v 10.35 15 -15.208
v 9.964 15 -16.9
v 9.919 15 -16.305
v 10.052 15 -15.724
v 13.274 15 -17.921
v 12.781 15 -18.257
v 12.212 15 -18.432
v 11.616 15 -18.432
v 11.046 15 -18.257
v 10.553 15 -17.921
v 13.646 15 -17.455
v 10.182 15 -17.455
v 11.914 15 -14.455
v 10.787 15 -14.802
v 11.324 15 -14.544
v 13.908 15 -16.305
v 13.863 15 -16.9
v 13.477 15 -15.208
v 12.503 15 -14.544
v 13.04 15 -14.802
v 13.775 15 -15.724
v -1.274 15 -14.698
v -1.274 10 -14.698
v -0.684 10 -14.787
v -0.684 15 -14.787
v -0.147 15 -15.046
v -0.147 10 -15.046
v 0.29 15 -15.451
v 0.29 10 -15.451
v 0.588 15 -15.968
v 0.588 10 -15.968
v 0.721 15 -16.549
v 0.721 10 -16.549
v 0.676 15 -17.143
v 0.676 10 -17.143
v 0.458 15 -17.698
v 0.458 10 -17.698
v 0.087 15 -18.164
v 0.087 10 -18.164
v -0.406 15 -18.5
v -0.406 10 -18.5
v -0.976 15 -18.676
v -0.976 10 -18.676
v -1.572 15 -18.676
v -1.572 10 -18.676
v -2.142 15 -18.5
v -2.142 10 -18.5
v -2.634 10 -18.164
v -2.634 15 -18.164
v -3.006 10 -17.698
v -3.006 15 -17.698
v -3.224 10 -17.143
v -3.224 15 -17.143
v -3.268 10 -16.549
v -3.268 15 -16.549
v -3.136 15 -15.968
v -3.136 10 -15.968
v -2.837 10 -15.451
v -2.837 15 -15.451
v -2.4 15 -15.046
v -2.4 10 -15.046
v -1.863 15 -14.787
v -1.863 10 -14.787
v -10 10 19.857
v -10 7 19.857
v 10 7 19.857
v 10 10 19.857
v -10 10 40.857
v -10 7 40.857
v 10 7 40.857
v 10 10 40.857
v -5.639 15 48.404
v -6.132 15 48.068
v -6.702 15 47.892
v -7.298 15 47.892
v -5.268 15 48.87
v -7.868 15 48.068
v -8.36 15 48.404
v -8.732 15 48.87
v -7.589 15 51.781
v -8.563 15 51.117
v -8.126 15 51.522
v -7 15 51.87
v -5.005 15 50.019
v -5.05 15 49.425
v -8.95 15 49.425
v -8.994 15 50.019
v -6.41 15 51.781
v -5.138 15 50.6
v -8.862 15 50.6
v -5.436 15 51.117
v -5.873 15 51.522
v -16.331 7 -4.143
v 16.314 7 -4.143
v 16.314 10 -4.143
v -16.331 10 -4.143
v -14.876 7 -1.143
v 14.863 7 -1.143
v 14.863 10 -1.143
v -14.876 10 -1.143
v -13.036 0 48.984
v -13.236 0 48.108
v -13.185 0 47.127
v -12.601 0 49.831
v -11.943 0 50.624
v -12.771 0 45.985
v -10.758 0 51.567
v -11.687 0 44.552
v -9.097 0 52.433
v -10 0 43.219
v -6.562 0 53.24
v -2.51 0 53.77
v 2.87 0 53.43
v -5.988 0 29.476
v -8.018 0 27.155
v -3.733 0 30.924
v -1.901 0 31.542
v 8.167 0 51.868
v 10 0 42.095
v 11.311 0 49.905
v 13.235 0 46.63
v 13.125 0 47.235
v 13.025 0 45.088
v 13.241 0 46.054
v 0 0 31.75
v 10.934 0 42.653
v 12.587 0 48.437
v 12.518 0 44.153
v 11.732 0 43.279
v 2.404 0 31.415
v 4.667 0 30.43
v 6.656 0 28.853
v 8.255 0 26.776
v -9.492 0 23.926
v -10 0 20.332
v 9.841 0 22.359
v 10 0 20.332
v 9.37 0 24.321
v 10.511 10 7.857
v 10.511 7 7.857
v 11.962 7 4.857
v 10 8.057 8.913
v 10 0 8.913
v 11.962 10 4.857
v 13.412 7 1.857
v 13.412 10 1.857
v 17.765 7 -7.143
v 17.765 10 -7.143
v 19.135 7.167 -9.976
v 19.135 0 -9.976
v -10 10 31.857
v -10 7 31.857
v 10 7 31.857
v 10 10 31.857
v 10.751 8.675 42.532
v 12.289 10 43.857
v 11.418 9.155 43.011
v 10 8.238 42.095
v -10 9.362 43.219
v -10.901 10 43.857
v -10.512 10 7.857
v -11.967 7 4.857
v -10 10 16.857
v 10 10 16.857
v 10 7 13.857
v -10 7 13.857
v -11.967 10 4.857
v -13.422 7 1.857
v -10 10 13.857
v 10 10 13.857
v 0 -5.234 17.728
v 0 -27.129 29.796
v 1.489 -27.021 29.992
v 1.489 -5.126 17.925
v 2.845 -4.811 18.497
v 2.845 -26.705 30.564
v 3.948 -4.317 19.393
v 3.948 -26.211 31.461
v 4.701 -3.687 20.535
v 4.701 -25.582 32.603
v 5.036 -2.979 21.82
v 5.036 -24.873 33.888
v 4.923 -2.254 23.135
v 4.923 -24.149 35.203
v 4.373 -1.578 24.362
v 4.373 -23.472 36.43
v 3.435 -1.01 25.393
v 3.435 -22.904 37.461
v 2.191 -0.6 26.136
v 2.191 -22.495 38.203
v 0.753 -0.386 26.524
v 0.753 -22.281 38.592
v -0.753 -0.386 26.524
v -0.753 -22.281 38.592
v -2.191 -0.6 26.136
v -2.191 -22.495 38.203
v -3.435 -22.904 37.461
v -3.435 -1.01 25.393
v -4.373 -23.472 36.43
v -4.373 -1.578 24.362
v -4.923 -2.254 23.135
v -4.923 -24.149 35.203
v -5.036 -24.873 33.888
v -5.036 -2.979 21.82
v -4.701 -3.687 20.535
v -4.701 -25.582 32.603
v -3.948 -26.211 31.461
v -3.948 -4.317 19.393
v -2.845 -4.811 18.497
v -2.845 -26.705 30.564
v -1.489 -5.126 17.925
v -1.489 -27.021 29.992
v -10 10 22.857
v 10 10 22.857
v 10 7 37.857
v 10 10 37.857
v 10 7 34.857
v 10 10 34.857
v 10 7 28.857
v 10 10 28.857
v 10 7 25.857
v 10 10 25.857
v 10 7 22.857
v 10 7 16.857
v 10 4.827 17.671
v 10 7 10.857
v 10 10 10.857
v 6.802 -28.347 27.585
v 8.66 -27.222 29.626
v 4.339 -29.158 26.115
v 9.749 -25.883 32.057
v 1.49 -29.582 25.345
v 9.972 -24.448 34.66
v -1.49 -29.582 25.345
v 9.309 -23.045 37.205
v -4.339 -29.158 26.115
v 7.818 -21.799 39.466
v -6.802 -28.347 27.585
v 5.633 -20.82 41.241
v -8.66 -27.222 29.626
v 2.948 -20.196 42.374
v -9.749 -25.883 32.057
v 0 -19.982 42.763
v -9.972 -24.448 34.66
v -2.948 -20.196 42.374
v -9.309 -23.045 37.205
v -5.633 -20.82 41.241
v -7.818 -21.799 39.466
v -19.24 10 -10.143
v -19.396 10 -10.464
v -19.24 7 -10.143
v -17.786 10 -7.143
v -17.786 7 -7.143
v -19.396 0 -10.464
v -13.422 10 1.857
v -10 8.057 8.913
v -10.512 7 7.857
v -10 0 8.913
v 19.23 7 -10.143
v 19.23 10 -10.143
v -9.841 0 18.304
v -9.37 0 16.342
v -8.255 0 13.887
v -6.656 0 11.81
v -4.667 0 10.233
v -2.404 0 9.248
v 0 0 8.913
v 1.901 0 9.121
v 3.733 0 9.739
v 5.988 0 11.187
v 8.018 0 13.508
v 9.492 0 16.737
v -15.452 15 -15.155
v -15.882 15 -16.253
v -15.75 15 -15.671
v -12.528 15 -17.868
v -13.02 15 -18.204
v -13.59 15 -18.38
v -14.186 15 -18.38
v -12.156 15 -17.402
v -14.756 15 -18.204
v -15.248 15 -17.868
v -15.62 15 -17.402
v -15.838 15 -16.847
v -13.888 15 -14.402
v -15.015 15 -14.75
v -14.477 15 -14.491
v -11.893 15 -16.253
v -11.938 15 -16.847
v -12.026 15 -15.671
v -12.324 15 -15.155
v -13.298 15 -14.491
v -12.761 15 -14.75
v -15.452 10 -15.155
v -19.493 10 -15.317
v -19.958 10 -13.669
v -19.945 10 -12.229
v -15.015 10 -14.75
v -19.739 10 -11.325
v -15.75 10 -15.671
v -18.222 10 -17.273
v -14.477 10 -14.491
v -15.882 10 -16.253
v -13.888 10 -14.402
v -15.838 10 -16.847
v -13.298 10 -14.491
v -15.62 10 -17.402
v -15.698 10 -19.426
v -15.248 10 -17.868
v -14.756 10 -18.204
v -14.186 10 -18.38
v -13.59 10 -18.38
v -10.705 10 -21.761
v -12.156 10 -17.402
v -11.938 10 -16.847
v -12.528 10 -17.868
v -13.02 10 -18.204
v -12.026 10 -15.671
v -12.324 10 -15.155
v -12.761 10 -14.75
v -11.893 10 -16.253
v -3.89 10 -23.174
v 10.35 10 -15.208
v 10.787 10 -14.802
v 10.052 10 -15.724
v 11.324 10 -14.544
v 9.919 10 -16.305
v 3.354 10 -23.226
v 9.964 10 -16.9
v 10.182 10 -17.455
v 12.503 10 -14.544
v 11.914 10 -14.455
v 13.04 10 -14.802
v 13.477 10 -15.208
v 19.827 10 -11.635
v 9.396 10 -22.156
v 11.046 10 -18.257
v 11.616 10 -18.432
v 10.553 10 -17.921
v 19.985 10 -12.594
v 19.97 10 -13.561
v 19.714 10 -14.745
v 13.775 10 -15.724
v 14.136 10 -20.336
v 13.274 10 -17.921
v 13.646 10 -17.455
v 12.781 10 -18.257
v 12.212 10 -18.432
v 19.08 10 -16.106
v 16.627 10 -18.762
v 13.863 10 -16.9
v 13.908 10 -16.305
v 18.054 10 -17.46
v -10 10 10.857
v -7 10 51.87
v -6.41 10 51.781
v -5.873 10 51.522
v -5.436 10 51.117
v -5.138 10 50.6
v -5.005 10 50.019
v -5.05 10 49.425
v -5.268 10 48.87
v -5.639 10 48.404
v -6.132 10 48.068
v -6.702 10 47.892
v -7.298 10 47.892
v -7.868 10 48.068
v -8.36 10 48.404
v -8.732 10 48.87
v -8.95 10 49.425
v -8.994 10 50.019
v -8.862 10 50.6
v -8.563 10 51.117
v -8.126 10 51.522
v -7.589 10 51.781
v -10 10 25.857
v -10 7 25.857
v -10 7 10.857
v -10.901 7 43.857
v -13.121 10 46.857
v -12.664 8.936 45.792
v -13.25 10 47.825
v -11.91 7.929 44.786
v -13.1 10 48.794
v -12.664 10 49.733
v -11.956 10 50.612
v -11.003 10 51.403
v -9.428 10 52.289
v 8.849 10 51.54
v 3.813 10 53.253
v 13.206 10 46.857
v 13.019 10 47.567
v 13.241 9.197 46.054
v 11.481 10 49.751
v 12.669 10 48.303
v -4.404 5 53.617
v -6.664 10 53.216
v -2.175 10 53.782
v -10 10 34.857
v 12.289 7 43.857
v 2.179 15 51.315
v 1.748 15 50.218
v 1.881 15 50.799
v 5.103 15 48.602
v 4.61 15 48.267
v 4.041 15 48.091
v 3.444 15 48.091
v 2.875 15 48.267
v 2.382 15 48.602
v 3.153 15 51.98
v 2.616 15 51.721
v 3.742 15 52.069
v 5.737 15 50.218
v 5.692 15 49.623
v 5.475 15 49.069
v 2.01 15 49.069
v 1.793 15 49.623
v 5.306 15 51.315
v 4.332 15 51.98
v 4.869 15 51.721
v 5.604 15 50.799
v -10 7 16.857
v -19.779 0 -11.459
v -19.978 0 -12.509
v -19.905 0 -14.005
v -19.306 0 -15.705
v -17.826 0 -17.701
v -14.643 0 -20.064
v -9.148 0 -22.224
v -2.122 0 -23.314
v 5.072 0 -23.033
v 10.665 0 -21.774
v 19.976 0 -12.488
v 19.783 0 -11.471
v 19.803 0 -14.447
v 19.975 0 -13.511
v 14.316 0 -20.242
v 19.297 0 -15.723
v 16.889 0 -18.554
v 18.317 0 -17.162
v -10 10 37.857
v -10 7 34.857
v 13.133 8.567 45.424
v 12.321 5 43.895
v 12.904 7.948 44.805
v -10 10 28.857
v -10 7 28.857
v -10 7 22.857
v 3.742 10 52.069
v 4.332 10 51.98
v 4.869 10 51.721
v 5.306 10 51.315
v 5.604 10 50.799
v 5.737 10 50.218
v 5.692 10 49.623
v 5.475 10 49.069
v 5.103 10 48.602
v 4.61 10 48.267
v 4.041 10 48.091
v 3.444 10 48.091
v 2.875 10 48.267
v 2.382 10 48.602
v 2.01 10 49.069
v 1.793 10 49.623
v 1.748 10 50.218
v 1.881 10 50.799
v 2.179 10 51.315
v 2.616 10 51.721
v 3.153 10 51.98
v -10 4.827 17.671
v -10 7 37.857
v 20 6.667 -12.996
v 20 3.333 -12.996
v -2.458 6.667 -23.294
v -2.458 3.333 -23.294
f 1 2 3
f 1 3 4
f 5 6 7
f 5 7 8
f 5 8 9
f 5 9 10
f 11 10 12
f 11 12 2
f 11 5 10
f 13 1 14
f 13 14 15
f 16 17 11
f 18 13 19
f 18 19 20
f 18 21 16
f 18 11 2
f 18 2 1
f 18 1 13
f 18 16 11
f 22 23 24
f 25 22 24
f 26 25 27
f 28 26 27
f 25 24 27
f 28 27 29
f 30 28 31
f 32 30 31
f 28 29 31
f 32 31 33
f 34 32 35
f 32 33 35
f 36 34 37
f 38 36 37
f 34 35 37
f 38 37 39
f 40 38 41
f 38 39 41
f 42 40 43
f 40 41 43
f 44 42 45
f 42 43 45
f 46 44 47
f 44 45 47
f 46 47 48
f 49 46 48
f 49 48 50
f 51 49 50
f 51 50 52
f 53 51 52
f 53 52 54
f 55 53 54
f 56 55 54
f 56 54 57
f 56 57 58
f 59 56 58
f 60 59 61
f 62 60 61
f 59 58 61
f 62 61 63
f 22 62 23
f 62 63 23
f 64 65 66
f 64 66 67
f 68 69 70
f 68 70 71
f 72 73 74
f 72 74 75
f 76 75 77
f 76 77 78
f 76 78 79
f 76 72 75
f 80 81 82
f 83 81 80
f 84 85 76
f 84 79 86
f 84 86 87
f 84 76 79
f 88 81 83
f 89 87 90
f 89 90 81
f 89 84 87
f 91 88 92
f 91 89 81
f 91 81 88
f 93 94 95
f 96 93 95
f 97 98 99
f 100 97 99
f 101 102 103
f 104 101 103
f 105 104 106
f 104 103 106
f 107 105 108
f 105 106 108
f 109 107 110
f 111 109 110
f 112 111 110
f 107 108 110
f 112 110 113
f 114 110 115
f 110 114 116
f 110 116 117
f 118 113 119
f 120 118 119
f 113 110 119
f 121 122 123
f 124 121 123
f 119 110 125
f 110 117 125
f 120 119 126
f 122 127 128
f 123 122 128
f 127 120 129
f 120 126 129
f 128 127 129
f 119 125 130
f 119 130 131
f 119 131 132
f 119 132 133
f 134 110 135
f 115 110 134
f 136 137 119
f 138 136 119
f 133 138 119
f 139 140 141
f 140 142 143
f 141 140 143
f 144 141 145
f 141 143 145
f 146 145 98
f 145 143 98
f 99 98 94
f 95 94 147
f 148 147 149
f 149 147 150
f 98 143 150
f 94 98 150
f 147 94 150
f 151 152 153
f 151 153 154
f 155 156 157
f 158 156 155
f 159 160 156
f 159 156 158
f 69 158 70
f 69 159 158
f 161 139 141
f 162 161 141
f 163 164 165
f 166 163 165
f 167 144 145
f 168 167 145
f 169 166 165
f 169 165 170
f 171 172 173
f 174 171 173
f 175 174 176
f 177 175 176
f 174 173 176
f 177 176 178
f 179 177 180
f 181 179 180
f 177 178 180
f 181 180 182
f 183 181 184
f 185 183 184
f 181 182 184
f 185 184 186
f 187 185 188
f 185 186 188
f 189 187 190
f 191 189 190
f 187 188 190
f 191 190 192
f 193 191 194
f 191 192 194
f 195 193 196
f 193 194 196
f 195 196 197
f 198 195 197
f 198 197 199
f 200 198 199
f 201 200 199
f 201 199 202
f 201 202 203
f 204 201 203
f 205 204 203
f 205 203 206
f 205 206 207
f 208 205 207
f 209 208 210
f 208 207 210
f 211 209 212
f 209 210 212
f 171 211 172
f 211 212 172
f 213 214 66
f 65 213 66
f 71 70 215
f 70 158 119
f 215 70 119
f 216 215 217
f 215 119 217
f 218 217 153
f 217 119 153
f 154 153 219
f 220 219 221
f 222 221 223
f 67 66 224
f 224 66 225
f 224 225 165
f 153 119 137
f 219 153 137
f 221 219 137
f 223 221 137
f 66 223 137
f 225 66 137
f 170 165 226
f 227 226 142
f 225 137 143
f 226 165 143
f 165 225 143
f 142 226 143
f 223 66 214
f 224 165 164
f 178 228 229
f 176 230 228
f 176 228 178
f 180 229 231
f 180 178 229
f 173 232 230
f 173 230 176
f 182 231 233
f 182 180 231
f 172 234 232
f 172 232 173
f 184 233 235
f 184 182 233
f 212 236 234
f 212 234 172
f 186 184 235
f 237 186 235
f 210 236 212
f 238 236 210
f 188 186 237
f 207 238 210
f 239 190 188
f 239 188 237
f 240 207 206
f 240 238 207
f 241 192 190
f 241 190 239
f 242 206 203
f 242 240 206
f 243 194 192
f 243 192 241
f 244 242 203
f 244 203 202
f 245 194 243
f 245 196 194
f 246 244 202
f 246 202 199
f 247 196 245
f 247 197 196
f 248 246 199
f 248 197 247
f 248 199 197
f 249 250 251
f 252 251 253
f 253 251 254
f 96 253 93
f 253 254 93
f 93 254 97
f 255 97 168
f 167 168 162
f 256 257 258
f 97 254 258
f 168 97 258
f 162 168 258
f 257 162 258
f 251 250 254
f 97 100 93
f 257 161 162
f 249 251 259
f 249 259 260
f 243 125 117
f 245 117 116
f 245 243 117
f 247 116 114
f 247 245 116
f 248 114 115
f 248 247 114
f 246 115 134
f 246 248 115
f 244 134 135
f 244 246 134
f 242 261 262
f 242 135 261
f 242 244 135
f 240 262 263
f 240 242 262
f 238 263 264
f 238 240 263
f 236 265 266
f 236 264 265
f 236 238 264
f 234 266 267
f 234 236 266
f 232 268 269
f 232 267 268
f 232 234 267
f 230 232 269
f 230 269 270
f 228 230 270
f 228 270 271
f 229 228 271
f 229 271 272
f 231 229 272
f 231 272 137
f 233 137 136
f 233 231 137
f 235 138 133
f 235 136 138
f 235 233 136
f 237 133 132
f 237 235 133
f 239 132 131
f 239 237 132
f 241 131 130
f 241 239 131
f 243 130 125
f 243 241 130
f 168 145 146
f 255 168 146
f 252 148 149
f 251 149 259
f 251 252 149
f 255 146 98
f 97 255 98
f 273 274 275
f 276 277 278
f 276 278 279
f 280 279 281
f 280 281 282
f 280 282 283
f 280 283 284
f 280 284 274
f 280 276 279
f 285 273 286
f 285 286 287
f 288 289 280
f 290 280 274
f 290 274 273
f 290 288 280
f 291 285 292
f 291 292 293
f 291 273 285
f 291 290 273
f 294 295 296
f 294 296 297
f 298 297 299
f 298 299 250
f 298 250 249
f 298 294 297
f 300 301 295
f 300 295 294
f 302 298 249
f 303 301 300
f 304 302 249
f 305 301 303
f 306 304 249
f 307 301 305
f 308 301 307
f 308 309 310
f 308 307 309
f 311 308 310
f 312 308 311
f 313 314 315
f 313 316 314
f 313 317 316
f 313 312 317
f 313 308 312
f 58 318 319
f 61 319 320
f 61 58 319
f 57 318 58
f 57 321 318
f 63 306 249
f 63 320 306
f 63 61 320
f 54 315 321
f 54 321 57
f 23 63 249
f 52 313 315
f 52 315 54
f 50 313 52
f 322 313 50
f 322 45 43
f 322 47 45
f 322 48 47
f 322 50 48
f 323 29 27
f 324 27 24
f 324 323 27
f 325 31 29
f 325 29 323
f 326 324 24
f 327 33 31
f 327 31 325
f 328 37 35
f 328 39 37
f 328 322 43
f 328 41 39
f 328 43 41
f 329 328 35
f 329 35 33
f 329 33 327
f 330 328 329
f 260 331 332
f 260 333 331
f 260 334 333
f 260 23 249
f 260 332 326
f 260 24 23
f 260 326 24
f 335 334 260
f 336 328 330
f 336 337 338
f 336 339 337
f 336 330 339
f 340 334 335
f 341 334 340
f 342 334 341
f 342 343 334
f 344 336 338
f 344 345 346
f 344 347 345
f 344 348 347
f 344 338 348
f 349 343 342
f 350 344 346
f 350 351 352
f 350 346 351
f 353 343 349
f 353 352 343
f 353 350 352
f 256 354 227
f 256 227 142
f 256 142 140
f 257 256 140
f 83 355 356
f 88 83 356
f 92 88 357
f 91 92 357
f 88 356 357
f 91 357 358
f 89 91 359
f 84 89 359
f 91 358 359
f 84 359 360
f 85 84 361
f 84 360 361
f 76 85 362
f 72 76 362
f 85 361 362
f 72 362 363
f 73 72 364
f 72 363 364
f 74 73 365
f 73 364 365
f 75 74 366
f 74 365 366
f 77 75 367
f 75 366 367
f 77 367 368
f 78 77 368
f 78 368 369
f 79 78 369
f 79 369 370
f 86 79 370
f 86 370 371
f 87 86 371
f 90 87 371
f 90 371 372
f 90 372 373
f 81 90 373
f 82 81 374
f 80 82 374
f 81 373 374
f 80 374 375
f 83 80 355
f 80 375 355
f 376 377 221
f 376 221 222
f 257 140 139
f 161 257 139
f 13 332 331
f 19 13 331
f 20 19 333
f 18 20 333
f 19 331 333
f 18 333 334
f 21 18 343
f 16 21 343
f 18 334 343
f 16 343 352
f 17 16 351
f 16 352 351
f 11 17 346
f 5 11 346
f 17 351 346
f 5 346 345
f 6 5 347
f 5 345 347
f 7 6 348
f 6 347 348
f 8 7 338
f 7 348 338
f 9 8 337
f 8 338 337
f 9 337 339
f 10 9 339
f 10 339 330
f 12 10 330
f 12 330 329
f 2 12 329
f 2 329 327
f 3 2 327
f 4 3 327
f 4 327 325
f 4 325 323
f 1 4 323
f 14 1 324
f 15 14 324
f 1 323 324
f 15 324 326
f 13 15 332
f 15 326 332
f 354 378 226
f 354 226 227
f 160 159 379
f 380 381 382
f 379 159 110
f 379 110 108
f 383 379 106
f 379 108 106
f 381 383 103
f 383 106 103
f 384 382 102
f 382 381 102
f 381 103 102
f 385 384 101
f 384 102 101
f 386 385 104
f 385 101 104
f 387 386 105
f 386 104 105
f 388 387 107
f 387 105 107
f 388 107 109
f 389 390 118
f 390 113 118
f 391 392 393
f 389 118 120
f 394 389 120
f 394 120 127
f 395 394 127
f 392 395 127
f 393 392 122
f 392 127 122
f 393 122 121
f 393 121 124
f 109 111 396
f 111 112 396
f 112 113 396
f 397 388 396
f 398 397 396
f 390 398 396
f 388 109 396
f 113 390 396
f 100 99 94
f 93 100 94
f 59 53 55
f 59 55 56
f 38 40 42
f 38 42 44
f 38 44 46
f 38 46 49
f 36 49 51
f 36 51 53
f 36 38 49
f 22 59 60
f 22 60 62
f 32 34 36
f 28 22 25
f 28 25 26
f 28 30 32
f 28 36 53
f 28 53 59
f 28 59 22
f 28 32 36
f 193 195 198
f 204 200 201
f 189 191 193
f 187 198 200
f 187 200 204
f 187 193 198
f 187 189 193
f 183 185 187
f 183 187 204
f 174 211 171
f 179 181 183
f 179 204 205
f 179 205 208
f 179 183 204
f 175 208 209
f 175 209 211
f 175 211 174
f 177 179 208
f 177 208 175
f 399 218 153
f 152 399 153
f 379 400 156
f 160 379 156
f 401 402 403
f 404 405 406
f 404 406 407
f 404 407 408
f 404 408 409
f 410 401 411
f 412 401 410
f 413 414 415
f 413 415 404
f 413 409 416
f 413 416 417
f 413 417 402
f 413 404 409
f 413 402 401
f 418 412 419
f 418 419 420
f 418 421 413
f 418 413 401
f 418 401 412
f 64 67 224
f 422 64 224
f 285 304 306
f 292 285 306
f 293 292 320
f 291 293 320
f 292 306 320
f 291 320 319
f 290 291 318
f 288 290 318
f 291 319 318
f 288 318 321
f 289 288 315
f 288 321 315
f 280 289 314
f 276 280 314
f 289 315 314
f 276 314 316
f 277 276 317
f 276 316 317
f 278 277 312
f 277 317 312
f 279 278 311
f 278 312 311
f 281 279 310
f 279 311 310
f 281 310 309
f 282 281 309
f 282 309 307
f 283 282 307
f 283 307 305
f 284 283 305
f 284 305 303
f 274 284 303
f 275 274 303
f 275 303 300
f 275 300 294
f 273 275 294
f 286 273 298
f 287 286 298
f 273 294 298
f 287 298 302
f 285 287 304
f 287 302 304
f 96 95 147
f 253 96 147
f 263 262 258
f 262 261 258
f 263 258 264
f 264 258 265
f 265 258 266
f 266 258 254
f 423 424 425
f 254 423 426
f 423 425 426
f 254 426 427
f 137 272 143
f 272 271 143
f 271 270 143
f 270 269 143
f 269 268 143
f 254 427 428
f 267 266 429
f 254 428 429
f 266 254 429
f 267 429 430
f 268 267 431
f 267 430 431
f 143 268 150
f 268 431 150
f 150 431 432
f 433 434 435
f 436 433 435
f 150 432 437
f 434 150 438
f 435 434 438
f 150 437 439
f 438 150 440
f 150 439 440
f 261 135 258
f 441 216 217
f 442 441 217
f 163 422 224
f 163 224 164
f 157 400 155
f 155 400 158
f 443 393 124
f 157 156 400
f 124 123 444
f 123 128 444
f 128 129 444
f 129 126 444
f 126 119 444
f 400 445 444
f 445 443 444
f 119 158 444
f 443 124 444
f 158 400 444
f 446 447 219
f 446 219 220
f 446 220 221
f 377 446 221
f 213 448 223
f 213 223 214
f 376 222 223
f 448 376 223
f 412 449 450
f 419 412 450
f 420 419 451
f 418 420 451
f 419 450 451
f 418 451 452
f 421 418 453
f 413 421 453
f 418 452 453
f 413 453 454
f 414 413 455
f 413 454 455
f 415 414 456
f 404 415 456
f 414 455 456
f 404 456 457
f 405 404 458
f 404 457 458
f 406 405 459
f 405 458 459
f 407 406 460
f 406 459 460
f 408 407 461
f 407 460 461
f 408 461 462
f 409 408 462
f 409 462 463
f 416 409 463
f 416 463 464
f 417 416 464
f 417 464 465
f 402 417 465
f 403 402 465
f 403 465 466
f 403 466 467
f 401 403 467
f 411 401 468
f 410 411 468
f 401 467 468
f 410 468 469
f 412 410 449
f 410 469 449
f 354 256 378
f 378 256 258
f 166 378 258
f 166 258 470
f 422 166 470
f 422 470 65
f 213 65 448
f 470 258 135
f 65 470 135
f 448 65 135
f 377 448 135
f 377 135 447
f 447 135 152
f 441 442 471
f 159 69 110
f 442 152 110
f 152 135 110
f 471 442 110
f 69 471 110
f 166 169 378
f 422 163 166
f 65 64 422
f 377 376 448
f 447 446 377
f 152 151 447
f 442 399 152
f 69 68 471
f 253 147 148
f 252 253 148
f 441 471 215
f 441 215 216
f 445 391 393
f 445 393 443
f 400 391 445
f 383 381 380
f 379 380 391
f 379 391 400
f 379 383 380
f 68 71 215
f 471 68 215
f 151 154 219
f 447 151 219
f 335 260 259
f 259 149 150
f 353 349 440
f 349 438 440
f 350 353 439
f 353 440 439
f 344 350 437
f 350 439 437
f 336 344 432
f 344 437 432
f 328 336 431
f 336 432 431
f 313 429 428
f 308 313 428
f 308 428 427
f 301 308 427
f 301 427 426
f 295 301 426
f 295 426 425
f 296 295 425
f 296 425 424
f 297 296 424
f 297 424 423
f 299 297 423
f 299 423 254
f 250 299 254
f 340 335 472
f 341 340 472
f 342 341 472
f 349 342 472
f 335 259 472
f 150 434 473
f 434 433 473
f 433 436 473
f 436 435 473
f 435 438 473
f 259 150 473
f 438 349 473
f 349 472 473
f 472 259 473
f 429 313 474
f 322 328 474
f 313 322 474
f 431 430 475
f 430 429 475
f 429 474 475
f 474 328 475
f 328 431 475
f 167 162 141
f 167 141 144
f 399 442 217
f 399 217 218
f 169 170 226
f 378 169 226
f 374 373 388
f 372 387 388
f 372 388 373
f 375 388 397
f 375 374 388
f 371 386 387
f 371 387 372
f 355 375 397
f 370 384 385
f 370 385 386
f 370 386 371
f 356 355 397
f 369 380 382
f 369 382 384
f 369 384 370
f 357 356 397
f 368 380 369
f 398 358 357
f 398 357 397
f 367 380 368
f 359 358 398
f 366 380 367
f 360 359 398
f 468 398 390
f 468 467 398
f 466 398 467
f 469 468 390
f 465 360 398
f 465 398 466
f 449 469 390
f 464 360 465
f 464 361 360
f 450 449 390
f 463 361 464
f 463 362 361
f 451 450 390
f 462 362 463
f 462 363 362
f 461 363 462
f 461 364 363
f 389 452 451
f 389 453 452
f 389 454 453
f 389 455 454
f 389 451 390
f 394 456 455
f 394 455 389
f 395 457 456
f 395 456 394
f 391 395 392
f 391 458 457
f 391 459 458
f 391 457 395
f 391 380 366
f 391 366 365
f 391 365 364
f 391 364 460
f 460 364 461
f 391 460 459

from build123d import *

# Parameters (mm, degrees)
EXTRUDE_2_DEPTH          = 10
SKETCH_8_R               = 5.05
CUT_EXTRUDE_1_DEPTH      = 25
CUT_EXTRUDE_2_DEPTH      = 65.589732479
CUT_EXTRUDE_2_DEPTH_BACK = 65.589732479
SKETCH_10_R              = 2
EXTRUDE_3_DEPTH          = 5


with BuildPart() as part:
    # Эскиз3 → Бобышка-Вытянуть2 (new body)
    with BuildSketch(Plane(origin=(0, 0, 0), x_dir=(1, 0, 0), z_dir=(0, 1, 0))):
        with BuildLine():
            Line((-19.39560228, 10.463829147), (-10, -8.913147143))
            Line((-10, -8.913147143), (-10, -43.218962734))
            add(Edge.make_bspline(
                [(-10, -43.218962734), (-22.788555386, -51.374706713), (-4.404292307, -53.617098764), (13.979970771, -55.859490815), (13.24081494, -46.053725186)],
                knots=[2.388060049, 2.388060049, 2.388060049, 4.335622678, 4.335622678, 6.283185307, 6.283185307, 6.283185307], degree=2, weights=[1, 0.562176345, 1, 0.562176345, 1]))
            add(Edge.make_bspline(
                [(13.24081494, -46.053725186), (13.063736407, -43.704571568), (10, -42.095048909)],
                knots=[0, 0, 0, 0.677674692, 0.677674692, 0.677674692], degree=2, weights=[1, 0.943141758, 1]))
            Line((10, -42.095048909), (10, -8.913147143))
            Line((10, -8.913147143), (19.134669767, 9.976263053))
            add(Edge.make_bspline(
                [(19.134669767, 9.976263053), (20, 11.452562535), (20, 12.995624946)],
                knots=[5.987949263, 5.987949263, 5.987949263, 6.283185307, 6.283185307, 6.283185307], degree=2, weights=[1, 0.989124231, 1]))
            add(Edge.make_bspline(
                [(20, 12.995624946), (20, 24.73727953), (-2.458450162, 23.293965899), (-24.916900324, 21.850652268), (-19.39560228, 10.463829147)],
                knots=[0, 0, 0, 1.694030518, 1.694030518, 3.388061035, 3.388061035, 3.388061035], degree=2, weights=[1, 0.66222258, 1, 0.66222258, 1]))
        make_face()
    extrude(amount=EXTRUDE_2_DEPTH)

    # Эскиз6 → Повернуть1 (revolve)
    with BuildSketch(Plane(origin=(0, 0, 0), x_dir=(0, 0, -1), z_dir=(1, 0, 0))):
        Polygon((-8.913147143, 0), (-25.247586294, -29.635848206), (-34.005408961, -24.808784696), (-20.331510337, 0), align=None)
    revolve(axis=Axis((0, 0, 20.331510337), (0, -0.8757822667380798, 0.48270635097035014)))

    # Эскиз8 → Вырез-Вытянуть1 (cut)
    with BuildSketch(Plane(origin=(0, -33.403842498, 18.411250756), x_dir=(1, 0, 0), z_dir=(0, -0.8757822667380799, 0.4827063509703501))):
        with Locations((0, 18.049384131)):
            Circle(SKETCH_8_R)
    extrude(amount=-CUT_EXTRUDE_1_DEPTH, mode=Mode.SUBTRACT)

    # Эскиз9 → Вырез-Вытянуть2 (cut, two sides: drawn at the far end of the back side and taken through both)
    with BuildSketch(Plane(origin=(0, 0, 0), x_dir=(0, 0, -1), z_dir=(1, 0, 0)).offset(-CUT_EXTRUDE_2_DEPTH_BACK)):
        Polygon((-43.856616521, 10), (-46.856616521, 10), (-43.856616521, 7), align=None)
        Polygon((-40.856616521, 10), (-43.856616521, 10), (-40.856616521, 7), align=None)
        Polygon((-37.856616521, 10), (-40.856616521, 10), (-37.856616521, 7), align=None)
        Polygon((-34.856616521, 10), (-37.856616521, 10), (-34.856616521, 7), align=None)
        Polygon((-31.856616521, 10), (-34.856616521, 10), (-31.856616521, 7), align=None)
        Polygon((-28.856616521, 10), (-31.856616521, 10), (-28.856616521, 7), align=None)
        Polygon((-25.856616521, 10), (-28.856616521, 10), (-25.856616521, 7), align=None)
        Polygon((-22.856616521, 10), (-25.856616521, 10), (-22.856616521, 7), align=None)
        Polygon((-19.856616521, 10), (-22.856616521, 10), (-19.856616521, 7), align=None)
        Polygon((-16.856616521, 10), (-19.856616521, 10), (-16.856616521, 7), align=None)
        Polygon((-13.856616521, 10), (-16.856616521, 10), (-13.856616521, 7), align=None)
        Polygon((-10.856616521, 10), (-13.856616521, 10), (-10.856616521, 7), align=None)
        Polygon((-7.856616521, 10), (-10.856616521, 10), (-7.856616521, 7), align=None)
        Polygon((-4.856616521, 10), (-7.856616521, 10), (-4.856616521, 7), align=None)
        Polygon((-1.856616521, 10), (-4.856616521, 10), (-1.856616521, 7), align=None)
        Polygon((1.143383479, 10), (-1.856616521, 10), (1.143383479, 7), align=None)
        Polygon((4.143383479, 10), (1.143383479, 10), (4.143383479, 7), align=None)
        Polygon((7.143383479, 10), (4.143383479, 10), (7.143383479, 7), align=None)
        Polygon((10.143383479, 10), (7.143383479, 10), (10.143383479, 7), align=None)
    extrude(amount=CUT_EXTRUDE_2_DEPTH + CUT_EXTRUDE_2_DEPTH_BACK, mode=Mode.SUBTRACT)

    # Эскиз10 → Бобышка-Вытянуть3 (add)
    with BuildSketch(Plane(origin=(0, 10, 0), x_dir=(1, 0, 0), z_dir=(0, 1, 0))):
        with Locations((-13.887887631, 16.40209469)):
            Circle(SKETCH_10_R)
        with Locations((-1.273826777, 16.698241985)):
            Circle(SKETCH_10_R)
        with Locations((11.913593592, 16.454746241)):
            Circle(SKETCH_10_R)
        with Locations((-6.999810032, -49.869756455)):
            Circle(SKETCH_10_R)
        with Locations((3.742496984, -50.068502191)):
            Circle(SKETCH_10_R)
    extrude(amount=EXTRUDE_3_DEPTH)


solid = part.part
